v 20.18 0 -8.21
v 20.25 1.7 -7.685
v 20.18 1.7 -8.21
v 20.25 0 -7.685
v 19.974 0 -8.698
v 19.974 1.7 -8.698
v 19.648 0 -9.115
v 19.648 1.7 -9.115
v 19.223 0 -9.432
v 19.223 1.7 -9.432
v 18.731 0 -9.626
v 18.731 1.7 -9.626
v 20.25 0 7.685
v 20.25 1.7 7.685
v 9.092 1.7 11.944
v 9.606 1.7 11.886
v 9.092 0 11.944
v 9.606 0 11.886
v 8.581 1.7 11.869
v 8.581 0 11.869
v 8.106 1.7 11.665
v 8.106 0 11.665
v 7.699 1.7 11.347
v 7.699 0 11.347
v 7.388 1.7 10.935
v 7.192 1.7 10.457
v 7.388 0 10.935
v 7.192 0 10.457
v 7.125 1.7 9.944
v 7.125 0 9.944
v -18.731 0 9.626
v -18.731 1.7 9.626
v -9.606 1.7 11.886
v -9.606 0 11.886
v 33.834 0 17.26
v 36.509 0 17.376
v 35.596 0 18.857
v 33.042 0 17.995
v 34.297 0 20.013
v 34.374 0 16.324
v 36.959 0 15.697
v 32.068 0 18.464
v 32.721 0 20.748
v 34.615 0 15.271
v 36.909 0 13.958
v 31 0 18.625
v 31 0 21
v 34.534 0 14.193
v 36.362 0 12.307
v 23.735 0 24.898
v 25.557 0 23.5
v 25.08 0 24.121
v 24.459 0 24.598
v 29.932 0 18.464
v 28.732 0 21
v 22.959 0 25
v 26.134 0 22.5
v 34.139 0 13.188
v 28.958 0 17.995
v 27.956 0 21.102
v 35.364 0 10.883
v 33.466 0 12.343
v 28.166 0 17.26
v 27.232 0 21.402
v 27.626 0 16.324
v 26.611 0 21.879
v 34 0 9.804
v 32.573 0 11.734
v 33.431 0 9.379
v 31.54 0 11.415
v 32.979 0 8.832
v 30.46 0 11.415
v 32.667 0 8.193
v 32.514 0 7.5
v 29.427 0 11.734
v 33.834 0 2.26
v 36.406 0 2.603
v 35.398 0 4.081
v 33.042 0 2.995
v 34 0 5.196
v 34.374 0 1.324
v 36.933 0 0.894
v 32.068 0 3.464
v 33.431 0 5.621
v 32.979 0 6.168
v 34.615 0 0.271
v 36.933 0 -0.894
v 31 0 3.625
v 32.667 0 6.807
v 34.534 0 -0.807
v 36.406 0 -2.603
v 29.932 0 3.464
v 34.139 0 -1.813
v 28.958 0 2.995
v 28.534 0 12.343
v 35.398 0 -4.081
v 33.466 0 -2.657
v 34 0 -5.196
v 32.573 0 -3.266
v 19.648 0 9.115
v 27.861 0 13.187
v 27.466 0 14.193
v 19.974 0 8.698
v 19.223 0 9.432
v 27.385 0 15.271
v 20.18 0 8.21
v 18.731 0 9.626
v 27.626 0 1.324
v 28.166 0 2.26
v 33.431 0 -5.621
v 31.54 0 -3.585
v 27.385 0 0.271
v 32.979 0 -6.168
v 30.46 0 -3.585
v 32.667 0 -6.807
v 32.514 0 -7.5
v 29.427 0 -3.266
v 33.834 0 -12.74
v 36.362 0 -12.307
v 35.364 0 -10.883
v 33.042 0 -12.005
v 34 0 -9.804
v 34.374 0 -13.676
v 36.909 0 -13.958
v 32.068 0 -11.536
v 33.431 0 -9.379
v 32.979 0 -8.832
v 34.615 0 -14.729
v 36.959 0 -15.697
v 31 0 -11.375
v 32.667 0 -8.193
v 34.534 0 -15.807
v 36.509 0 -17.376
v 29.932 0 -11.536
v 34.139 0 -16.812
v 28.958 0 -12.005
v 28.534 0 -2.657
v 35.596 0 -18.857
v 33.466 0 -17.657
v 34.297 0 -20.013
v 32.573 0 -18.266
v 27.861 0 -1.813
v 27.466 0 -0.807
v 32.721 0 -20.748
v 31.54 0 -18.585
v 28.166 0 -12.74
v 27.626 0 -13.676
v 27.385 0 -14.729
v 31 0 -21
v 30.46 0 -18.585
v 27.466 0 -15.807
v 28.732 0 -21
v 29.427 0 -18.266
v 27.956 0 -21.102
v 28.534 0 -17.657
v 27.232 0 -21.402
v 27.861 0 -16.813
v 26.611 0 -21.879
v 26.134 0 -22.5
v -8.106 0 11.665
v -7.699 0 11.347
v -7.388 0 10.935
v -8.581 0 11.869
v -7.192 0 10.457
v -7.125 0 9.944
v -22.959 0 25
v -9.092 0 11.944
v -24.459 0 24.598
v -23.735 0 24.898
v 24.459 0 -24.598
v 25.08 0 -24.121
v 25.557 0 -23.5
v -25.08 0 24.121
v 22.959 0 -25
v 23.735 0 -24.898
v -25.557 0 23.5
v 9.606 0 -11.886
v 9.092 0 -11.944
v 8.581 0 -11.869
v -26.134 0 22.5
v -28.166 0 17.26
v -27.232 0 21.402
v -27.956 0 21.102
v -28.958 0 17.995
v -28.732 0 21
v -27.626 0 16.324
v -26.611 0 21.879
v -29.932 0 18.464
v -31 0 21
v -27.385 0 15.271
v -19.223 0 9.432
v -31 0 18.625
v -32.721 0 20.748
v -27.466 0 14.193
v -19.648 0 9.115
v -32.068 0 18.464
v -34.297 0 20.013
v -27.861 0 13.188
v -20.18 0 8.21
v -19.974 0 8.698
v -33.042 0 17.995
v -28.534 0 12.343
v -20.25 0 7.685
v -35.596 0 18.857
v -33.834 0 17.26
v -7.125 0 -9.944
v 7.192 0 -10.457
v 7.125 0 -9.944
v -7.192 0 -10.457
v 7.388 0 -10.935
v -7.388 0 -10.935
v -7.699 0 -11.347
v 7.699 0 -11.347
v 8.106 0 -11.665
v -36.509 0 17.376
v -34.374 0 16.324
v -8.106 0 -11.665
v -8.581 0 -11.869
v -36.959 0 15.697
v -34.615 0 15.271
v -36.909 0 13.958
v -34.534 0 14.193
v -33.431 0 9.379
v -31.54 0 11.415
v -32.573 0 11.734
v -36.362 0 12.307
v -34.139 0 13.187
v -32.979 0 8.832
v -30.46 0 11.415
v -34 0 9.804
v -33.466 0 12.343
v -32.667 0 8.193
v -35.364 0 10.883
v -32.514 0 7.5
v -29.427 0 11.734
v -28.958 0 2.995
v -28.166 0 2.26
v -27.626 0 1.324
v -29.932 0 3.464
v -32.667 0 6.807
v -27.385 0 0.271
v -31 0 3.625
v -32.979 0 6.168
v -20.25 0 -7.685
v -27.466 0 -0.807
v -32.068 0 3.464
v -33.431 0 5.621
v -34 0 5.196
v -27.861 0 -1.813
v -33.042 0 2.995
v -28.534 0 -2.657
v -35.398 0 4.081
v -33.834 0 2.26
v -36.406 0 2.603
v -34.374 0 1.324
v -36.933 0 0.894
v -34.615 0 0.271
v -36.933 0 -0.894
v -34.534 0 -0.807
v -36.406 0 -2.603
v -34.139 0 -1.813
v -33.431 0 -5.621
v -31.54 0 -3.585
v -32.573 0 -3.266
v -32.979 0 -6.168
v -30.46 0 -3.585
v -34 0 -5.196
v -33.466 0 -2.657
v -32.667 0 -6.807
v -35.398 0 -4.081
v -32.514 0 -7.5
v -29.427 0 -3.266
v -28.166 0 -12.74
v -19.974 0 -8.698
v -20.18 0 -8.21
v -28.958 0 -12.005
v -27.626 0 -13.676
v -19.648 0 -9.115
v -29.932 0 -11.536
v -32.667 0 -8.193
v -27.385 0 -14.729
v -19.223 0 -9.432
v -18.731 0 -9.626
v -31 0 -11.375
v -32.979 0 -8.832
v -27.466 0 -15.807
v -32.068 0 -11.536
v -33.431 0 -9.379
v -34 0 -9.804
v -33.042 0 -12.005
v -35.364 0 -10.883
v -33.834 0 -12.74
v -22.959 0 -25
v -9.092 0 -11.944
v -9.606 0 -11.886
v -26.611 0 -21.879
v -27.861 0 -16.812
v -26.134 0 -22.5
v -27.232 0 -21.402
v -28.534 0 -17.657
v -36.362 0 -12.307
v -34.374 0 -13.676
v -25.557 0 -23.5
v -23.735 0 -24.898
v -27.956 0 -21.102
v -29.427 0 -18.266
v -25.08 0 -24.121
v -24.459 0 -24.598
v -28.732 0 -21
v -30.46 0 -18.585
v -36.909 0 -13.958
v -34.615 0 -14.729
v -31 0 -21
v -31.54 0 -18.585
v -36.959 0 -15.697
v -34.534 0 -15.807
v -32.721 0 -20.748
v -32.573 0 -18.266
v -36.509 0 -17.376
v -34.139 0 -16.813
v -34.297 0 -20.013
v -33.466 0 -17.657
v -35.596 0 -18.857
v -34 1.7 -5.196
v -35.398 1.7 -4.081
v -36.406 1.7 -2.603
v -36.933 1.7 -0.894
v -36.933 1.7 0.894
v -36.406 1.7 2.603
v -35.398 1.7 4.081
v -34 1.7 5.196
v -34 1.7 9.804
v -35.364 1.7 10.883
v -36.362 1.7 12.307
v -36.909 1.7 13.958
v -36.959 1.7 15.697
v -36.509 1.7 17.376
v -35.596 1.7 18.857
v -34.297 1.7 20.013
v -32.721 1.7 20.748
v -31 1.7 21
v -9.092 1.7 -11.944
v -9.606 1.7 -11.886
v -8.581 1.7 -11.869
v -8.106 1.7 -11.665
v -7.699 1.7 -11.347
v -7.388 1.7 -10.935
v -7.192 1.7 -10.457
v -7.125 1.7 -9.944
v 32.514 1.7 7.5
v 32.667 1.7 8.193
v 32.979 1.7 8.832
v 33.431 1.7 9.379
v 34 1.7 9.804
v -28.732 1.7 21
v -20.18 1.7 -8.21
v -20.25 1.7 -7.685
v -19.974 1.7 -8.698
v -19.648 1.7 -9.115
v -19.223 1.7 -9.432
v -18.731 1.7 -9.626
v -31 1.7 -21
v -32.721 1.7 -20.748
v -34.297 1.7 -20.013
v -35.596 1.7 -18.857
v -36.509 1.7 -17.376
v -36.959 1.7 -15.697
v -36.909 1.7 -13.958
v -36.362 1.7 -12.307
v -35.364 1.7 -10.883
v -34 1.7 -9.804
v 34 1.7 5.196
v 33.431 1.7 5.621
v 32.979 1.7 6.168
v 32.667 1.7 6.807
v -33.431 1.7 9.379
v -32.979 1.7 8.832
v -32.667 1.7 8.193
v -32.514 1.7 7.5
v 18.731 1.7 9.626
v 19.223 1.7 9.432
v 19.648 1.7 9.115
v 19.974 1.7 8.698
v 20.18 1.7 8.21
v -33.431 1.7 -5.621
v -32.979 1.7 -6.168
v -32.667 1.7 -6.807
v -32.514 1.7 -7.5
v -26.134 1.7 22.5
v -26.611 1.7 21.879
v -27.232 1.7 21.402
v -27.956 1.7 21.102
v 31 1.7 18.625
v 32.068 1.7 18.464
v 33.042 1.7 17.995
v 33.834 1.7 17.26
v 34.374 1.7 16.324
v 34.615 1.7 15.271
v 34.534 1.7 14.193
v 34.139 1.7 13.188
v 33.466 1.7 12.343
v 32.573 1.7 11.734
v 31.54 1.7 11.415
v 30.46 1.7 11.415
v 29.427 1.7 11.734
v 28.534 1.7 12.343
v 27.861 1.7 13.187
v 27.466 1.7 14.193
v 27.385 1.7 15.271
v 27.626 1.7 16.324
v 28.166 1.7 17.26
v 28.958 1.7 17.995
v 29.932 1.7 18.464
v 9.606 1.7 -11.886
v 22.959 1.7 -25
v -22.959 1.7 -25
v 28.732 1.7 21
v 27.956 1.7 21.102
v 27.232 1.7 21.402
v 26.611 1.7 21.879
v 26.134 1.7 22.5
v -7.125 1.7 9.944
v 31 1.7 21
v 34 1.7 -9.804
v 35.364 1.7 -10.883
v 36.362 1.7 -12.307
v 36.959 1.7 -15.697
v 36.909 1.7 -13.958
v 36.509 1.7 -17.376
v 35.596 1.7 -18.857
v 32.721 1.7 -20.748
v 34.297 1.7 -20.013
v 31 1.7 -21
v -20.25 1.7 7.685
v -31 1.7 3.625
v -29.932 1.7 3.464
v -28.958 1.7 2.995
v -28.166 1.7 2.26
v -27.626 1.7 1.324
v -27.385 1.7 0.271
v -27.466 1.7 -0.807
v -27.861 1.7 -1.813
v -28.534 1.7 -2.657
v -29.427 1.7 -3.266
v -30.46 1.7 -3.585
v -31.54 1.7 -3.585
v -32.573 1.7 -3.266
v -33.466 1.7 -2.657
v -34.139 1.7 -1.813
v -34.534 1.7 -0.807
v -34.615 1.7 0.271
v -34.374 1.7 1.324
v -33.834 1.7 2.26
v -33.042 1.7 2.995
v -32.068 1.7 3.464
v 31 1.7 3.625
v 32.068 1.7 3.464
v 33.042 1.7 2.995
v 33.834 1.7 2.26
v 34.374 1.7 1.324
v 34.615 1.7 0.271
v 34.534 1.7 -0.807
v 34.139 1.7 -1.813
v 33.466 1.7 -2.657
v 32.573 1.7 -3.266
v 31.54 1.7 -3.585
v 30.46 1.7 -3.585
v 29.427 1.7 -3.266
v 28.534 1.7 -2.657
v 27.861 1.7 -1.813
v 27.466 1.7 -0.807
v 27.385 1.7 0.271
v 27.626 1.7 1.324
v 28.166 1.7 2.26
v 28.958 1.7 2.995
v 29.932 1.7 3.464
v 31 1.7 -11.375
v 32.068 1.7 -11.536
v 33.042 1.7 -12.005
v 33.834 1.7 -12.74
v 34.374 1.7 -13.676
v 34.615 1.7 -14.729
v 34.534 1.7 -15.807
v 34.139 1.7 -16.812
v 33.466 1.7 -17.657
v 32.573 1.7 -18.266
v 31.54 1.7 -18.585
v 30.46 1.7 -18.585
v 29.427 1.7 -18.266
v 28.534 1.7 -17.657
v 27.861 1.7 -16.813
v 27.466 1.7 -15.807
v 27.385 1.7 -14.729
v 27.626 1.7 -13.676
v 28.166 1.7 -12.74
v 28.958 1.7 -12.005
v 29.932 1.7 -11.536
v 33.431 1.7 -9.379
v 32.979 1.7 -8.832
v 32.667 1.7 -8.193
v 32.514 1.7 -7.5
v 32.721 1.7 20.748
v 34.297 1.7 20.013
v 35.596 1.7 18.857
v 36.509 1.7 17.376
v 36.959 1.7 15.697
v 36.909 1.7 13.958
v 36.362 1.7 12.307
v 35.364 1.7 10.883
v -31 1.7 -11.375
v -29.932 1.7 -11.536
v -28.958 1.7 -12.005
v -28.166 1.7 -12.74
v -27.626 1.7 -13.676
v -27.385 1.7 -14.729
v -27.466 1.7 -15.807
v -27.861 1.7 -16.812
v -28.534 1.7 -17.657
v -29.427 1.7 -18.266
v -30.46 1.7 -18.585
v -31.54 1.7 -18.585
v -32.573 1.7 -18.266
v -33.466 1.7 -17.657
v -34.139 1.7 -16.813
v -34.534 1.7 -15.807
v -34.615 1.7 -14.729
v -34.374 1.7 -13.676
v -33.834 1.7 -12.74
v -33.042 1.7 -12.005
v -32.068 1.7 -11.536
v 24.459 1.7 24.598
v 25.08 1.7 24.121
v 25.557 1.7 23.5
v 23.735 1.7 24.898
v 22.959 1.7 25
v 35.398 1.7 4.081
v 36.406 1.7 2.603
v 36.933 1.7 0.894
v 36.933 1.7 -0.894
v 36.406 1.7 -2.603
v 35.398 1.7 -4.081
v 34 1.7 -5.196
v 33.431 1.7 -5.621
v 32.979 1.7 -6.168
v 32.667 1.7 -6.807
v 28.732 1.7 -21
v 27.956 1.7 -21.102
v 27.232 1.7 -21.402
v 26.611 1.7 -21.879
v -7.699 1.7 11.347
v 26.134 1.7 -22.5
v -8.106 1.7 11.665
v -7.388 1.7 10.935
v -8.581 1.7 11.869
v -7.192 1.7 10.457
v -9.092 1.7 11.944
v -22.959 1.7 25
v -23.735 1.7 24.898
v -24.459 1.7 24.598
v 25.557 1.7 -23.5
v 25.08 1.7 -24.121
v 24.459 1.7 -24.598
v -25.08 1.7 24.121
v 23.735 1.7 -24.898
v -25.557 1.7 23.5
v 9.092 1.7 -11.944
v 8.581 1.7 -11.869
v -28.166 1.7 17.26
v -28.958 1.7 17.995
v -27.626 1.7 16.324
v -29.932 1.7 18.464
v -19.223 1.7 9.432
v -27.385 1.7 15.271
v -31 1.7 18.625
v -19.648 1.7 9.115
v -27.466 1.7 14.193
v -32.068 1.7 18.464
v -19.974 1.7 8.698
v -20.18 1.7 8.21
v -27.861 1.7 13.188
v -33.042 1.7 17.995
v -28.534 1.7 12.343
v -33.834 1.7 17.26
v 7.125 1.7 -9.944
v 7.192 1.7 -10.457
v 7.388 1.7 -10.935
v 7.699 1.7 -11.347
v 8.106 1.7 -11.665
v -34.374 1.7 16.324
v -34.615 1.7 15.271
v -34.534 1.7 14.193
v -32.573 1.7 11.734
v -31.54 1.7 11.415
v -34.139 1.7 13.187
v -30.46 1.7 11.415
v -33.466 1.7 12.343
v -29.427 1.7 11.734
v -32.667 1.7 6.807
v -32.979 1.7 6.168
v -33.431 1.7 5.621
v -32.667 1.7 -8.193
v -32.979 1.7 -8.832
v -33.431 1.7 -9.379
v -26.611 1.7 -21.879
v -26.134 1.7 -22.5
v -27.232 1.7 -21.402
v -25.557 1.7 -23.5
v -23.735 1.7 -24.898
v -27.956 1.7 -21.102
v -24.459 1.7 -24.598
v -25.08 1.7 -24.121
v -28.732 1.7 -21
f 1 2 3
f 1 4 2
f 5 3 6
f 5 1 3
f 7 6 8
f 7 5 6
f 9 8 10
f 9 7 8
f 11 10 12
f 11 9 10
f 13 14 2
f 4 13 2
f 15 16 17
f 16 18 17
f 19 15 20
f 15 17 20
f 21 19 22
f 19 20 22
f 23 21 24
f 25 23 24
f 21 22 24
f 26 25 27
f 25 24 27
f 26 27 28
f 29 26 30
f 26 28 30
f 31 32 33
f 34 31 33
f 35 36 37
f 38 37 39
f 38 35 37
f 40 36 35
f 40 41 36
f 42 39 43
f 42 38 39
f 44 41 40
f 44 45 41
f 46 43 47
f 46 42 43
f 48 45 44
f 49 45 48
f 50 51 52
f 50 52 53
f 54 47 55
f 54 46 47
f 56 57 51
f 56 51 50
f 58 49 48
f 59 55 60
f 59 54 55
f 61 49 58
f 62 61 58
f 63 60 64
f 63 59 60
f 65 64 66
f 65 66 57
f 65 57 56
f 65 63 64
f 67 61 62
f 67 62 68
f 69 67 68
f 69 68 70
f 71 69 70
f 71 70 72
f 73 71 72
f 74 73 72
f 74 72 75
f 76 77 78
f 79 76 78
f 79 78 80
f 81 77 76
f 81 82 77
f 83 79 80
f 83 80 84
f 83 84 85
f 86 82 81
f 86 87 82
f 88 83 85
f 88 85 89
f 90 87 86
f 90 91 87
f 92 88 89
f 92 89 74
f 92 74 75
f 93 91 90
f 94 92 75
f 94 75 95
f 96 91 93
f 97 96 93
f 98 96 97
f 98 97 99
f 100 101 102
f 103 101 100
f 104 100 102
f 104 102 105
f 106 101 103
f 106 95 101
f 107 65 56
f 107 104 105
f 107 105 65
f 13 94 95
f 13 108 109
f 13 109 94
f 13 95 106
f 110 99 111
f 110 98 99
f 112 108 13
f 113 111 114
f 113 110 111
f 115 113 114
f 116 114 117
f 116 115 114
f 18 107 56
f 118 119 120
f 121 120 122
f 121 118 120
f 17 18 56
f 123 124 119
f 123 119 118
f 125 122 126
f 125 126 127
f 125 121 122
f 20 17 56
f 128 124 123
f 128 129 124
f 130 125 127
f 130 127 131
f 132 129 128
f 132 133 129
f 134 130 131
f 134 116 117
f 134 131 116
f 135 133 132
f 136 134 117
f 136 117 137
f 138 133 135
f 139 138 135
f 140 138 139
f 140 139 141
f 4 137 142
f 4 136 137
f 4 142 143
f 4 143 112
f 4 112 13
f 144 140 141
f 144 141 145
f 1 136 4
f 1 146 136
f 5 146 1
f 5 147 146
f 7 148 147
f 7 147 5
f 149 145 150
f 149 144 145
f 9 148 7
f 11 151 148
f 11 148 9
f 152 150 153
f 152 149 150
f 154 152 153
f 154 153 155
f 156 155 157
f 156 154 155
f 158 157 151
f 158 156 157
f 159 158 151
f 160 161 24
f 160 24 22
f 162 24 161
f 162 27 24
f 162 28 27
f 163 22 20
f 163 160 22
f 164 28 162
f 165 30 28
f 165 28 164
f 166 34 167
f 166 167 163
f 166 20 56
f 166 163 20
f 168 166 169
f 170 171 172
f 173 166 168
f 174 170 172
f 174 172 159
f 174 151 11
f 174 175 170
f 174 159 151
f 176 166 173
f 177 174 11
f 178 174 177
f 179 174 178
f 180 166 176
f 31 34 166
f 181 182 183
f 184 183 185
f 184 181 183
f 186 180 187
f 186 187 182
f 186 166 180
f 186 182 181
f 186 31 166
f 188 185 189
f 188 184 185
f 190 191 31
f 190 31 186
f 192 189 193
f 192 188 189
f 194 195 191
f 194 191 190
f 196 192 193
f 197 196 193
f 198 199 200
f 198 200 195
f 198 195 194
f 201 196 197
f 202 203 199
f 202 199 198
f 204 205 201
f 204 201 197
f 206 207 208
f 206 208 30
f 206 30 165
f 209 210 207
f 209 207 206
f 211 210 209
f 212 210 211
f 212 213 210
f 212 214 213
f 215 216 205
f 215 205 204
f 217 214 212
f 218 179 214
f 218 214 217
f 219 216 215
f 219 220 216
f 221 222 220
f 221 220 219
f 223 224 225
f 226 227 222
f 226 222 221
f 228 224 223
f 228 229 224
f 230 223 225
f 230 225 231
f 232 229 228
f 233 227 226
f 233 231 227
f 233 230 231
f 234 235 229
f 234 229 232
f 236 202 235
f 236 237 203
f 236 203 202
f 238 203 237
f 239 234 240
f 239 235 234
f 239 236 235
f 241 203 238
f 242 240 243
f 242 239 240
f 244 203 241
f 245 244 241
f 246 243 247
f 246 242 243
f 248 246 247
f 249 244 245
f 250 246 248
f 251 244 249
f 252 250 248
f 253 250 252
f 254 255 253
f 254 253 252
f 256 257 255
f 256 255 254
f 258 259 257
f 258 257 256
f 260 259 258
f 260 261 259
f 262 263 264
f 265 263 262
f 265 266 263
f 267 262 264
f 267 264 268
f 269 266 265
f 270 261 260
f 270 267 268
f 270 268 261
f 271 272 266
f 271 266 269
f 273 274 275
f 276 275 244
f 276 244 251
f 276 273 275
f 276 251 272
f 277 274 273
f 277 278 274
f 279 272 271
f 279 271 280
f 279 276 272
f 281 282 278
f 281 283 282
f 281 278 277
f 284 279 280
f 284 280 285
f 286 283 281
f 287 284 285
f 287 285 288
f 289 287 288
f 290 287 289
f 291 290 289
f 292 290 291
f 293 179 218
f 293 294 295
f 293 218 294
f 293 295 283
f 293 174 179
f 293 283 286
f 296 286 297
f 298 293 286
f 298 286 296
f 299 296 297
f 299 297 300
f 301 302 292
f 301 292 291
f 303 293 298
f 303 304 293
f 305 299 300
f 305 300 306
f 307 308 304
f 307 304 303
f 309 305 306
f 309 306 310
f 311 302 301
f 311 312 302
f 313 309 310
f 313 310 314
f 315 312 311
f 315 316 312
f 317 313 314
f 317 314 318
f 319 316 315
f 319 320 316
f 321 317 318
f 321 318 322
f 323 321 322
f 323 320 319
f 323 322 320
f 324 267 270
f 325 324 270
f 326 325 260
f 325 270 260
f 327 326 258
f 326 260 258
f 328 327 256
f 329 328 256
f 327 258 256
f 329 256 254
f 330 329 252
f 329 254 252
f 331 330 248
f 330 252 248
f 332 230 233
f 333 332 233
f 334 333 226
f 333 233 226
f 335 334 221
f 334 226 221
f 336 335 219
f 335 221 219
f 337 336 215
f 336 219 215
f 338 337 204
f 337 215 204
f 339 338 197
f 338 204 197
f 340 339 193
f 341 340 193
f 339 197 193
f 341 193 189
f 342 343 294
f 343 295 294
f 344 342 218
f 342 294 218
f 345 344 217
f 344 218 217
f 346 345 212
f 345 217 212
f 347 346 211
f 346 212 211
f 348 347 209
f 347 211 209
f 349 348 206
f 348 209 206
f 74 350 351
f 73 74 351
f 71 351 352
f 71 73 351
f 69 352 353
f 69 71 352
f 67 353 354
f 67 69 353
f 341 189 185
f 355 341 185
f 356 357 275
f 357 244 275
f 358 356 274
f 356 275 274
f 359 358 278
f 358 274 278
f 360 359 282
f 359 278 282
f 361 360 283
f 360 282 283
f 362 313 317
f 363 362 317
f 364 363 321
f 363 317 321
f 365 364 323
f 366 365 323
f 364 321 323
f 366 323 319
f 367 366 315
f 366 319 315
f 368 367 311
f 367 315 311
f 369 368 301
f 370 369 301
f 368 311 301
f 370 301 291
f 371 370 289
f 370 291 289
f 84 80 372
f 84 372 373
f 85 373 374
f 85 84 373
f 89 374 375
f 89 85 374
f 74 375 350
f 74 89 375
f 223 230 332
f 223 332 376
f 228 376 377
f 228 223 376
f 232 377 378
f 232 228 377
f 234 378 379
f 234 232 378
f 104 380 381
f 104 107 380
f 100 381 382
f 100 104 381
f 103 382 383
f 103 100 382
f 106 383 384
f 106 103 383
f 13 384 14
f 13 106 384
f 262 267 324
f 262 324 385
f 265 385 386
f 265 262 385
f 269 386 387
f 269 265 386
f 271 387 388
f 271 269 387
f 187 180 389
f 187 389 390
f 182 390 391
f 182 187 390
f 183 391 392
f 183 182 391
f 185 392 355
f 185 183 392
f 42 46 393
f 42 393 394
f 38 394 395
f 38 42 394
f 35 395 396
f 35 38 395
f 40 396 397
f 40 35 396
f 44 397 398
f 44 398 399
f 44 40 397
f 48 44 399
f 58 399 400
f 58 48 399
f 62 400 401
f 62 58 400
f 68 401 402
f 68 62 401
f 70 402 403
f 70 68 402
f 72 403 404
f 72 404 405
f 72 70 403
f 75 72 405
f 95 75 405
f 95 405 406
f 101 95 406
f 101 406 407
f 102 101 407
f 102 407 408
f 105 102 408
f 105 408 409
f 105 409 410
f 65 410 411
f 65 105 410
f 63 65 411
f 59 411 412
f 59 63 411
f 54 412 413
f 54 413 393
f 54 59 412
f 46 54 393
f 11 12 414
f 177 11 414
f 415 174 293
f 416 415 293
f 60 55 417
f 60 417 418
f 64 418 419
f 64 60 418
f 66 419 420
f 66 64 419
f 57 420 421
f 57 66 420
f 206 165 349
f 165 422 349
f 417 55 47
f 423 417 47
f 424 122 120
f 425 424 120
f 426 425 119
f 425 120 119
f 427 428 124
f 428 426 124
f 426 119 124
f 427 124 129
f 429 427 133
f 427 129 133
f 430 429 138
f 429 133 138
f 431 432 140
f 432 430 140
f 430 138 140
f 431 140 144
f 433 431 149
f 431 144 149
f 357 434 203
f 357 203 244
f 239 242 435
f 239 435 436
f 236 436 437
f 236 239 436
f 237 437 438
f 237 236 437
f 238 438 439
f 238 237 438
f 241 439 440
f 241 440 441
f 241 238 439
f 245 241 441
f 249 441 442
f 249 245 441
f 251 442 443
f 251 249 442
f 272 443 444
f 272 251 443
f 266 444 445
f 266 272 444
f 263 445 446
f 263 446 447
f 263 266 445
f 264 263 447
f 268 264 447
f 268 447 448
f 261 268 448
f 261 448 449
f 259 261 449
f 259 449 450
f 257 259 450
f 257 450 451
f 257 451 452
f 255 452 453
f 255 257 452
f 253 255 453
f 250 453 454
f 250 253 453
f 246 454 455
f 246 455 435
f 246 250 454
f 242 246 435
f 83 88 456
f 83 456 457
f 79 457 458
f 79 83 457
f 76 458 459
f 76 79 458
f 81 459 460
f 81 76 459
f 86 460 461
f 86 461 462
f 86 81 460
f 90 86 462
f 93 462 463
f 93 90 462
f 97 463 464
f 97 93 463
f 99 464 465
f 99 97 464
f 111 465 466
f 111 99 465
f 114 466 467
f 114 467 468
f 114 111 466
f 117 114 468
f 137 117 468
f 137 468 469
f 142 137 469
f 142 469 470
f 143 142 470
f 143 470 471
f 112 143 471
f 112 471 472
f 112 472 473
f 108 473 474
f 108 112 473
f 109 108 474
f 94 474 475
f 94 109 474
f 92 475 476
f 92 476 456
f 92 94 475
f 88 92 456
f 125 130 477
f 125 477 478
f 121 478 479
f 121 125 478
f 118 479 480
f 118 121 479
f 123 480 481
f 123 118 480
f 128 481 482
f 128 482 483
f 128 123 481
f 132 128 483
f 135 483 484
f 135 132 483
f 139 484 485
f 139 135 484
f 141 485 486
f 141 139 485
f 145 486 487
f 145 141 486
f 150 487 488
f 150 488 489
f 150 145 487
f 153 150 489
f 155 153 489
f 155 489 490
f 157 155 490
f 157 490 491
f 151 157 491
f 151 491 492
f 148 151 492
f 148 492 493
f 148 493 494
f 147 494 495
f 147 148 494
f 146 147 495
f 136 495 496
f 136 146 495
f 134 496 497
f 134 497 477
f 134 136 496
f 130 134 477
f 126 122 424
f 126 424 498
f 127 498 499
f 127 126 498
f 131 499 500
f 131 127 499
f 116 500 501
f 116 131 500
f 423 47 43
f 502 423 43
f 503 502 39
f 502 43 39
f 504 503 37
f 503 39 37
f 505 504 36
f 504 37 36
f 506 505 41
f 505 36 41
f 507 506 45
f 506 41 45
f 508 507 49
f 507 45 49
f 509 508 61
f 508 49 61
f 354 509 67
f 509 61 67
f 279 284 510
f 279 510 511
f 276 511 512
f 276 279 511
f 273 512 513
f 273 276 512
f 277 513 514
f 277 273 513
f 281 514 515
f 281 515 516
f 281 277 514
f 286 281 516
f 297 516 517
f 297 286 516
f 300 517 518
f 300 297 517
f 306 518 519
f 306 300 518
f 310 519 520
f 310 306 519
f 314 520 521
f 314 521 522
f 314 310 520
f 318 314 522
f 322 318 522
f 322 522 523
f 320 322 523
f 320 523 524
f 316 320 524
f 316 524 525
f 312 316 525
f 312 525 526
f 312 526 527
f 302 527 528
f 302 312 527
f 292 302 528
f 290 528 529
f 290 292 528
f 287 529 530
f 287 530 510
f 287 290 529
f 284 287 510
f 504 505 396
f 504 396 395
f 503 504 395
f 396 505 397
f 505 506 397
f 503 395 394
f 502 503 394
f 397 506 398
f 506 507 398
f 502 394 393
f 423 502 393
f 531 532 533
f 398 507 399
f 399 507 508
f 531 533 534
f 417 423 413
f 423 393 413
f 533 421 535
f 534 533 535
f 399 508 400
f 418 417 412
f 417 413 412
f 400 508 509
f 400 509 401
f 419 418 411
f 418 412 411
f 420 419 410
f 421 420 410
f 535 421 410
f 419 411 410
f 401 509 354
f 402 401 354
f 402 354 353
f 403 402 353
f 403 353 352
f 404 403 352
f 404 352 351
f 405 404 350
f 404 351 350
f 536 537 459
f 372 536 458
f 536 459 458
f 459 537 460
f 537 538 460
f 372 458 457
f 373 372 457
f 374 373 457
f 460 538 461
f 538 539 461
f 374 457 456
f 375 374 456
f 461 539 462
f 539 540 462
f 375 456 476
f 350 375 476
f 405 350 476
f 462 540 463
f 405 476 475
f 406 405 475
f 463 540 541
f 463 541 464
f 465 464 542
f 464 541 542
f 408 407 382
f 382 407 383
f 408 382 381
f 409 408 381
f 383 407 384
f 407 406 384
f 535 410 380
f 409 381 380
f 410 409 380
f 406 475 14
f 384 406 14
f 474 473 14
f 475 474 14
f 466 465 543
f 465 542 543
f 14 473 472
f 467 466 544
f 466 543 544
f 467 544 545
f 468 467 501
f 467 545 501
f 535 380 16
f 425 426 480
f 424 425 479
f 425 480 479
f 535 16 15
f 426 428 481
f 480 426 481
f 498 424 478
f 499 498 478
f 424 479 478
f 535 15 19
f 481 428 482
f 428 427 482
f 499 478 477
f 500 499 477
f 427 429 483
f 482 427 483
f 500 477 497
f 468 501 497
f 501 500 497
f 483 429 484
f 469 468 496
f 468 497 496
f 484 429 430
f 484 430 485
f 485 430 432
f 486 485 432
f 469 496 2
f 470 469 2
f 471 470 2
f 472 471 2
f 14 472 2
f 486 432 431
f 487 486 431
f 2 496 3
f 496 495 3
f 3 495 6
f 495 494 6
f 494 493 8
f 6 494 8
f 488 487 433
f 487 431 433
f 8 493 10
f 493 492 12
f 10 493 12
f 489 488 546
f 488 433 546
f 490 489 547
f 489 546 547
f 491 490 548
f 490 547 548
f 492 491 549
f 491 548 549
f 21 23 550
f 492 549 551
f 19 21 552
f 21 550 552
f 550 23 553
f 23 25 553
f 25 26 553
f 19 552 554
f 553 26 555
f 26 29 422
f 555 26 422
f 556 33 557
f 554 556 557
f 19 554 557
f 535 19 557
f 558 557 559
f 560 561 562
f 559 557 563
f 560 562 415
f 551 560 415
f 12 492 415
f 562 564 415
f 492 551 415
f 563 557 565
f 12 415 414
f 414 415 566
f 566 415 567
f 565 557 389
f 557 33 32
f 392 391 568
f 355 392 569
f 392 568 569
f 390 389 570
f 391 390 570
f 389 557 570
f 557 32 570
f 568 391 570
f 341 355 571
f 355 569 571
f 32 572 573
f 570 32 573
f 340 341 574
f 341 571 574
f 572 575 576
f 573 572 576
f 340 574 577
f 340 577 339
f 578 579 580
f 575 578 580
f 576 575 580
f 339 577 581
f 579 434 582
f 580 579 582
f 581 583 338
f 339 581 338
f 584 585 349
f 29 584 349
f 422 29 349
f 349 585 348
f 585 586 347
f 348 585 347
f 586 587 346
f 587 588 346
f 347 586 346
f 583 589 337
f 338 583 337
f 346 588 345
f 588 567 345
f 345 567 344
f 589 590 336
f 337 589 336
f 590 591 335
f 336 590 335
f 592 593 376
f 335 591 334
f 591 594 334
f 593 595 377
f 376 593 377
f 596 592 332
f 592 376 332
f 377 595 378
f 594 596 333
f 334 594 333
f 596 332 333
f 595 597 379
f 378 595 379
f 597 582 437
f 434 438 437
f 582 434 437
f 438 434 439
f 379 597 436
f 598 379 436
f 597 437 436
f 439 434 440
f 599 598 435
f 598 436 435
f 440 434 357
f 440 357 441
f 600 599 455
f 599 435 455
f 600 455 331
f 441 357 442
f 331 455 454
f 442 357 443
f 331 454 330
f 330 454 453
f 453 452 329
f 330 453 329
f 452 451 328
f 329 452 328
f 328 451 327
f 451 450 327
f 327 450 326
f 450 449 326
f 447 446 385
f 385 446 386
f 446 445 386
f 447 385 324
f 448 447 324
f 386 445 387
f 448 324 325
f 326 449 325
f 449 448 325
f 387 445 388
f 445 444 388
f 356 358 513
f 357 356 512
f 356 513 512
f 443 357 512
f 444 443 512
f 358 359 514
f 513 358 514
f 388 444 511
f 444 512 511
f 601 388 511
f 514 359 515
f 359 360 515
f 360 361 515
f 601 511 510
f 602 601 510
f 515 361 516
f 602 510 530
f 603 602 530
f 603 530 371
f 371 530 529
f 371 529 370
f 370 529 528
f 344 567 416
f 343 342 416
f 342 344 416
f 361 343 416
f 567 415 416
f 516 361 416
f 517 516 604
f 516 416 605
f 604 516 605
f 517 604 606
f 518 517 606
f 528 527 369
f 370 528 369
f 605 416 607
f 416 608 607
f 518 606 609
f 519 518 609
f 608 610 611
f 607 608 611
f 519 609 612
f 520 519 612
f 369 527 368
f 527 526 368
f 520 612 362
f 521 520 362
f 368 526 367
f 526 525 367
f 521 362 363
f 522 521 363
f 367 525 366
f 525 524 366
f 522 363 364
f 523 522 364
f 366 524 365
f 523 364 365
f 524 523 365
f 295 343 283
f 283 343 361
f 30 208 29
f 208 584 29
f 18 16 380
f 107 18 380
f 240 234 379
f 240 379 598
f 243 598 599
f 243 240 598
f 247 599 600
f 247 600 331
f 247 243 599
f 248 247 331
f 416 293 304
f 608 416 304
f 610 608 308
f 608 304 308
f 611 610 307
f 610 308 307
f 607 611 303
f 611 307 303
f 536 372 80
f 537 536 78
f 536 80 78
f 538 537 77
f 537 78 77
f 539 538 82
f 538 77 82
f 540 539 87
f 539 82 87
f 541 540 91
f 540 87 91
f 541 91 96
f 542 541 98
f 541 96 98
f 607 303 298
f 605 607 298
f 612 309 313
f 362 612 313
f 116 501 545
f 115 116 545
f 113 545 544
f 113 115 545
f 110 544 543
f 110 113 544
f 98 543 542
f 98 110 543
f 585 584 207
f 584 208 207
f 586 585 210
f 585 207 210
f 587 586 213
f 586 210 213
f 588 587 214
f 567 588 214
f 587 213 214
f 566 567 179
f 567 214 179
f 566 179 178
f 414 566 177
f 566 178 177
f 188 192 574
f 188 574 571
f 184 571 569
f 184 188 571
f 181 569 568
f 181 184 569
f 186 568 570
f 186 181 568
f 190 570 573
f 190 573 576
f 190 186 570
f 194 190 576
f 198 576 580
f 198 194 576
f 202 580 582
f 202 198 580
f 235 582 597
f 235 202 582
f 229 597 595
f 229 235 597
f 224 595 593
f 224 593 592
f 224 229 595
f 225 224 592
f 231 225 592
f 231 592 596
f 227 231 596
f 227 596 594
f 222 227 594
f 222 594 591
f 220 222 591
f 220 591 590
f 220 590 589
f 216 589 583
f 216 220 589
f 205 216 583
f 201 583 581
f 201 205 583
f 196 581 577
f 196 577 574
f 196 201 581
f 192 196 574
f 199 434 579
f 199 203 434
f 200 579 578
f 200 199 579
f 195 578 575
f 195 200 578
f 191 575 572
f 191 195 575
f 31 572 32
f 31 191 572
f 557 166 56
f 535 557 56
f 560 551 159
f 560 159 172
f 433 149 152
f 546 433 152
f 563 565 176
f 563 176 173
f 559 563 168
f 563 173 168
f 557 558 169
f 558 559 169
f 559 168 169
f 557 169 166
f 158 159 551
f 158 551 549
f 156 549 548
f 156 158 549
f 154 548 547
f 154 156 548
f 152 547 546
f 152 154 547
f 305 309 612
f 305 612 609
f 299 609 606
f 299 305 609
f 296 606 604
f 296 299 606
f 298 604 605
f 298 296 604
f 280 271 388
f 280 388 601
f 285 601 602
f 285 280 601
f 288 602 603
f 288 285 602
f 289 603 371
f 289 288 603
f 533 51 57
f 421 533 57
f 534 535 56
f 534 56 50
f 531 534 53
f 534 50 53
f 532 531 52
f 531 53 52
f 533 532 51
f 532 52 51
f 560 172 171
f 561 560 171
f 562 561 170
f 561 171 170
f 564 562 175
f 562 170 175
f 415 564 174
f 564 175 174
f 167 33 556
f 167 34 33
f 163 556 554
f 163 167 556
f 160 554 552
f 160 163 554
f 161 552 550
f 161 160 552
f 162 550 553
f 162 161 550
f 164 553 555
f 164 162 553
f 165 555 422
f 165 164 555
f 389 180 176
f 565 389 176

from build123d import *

# Parameters (mm, degrees)
SKETCH1_R           = 6
SKETCH1_R_2         = 3.625
BOSS_EXTRUDE1_DEPTH = 1.7
CUT_EXTRUDE1_REACH  = 46.687
SKETCH2_W           = 13.125
SKETCH2_H           = 18.5
FILLET1_R           = 3
FILLET2_R           = 2


with BuildPart() as part:
    # Sketch1 → Boss-Extrude1 (new body)
    # profile 1 of 7: a face of its own
    with BuildSketch(Plane(origin=(0, 0, 0), x_dir=(1, 0, 0), z_dir=(0, 1, 0))):
        with BuildLine():
            Line((24.690598923, 25), (-24.690598923, 25))
            Line((-24.690598923, 25), (-27, 21))
            Line((-27, 21), (-31, 21))
            ThreePointArc((-31, 21), (-26.757359313, 19.242640687), (-25, 15))
            ThreePointArc((-25, 15), (-27.325765386, 10.25658351), (-32.5, 9.190524981))
            Line((-32.5, 9.190524981), (-32.5, 5.809475019))
            ThreePointArc((-32.5, 5.809475019), (-27.325765386, 4.74341649), (-25, 0))
            ThreePointArc((-25, 0), (-27.325765386, -4.74341649), (-32.5, -5.809475019))
            Line((-32.5, -5.809475019), (-32.5, -9.190524981))
            ThreePointArc((-32.5, -9.190524981), (-27.325765386, -10.25658351), (-25, -15))
            ThreePointArc((-25, -15), (-26.757359313, -19.242640687), (-31, -21))
            Line((-31, -21), (-27, -21))
            Line((-27, -21), (-24.690598923, -25))
            Line((-24.690598923, -25), (24.690598923, -25))
            Line((24.690598923, -25), (27, -21))
            Line((27, -21), (31, -21))
            ThreePointArc((31, -21), (25.047821822, -14.243974245), (32.5, -9.190524981))
            Line((32.5, -9.190524981), (32.5, -5.809475019))
            ThreePointArc((32.5, -5.809475019), (25, 0), (32.5, 5.809475019))
            Line((32.5, 5.809475019), (32.5, 9.190524981))
            ThreePointArc((32.5, 9.190524981), (25.047821822, 14.243974245), (31, 21))
            Line((31, 21), (27, 21))
            Line((27, 21), (24.690598923, 25))
        make_face()
    # profile 2 of 7: a face of its own
    with BuildSketch(Plane(origin=(0, 0, 0), x_dir=(1, 0, 0), z_dir=(0, 1, 0))):
        with Locations((-31, 15)):
            Circle(SKETCH1_R)
        with Locations(Location((-31, 15, 0), (0, 0, 270))):
            Circle(SKETCH1_R_2, mode=Mode.SUBTRACT)
    # profile 3 of 7: a face of its own
    with BuildSketch(Plane(origin=(0, 0, 0), x_dir=(1, 0, 0), z_dir=(0, 1, 0))):
        with Locations((-31, 0)):
            Circle(SKETCH1_R)
        with Locations(Location((-31, 0, 0), (0, 0, 270))):
            Circle(SKETCH1_R_2, mode=Mode.SUBTRACT)
    # profile 4 of 7: a face of its own
    with BuildSketch(Plane(origin=(0, 0, 0), x_dir=(1, 0, 0), z_dir=(0, 1, 0))):
        with Locations((-31, -15)):
            Circle(SKETCH1_R)
        with Locations(Location((-31, -15, 0), (0, 0, 270))):
            Circle(SKETCH1_R_2, mode=Mode.SUBTRACT)
    # profile 5 of 7: a face of its own
    with BuildSketch(Plane(origin=(0, 0, 0), x_dir=(1, 0, 0), z_dir=(0, 1, 0))):
        with Locations((31, -15)):
            Circle(SKETCH1_R)
        with Locations(Location((31, -15, 0), (0, 0, 270))):
            Circle(SKETCH1_R_2, mode=Mode.SUBTRACT)
    # profile 6 of 7: a face of its own
    with BuildSketch(Plane(origin=(0, 0, 0), x_dir=(1, 0, 0), z_dir=(0, 1, 0))):
        with Locations((31, 0)):
            Circle(SKETCH1_R)
        with Locations(Location((31, 0, 0), (0, 0, 270))):
            Circle(SKETCH1_R_2, mode=Mode.SUBTRACT)
    # profile 7 of 7: a face of its own
    with BuildSketch(Plane(origin=(0, 0, 0), x_dir=(1, 0, 0), z_dir=(0, 1, 0))):
        with Locations((31, 15)):
            Circle(SKETCH1_R)
        with Locations(Location((31, 15, 0), (0, 0, 270))):
            Circle(SKETCH1_R_2, mode=Mode.SUBTRACT)
    extrude(amount=BOSS_EXTRUDE1_DEPTH)

    # Sketch2 → Cut-Extrude1 (cut, up to next)
    with BuildSketch(Plane(origin=(0, 1.7, 0), x_dir=(1, 0, 0), z_dir=(0, 1, 0)), mode=Mode.PRIVATE) as cut_extrude1_sk1:
        with Locations((-13.6875, 0)):
            Rectangle(SKETCH2_W, SKETCH2_H)
    cut_extrude1_tool1 = extrude(cut_extrude1_sk1.sketch, amount=-CUT_EXTRUDE1_REACH, mode=Mode.PRIVATE) & part.part
    # Sketch2 → Cut-Extrude1 (cut, up to next)
    with BuildSketch(Plane(origin=(0, 1.7, 0), x_dir=(1, 0, 0), z_dir=(0, 1, 0)), mode=Mode.PRIVATE) as cut_extrude1_sk2:
        Polygon((-7.125, 9.25), (-7.125, 12.5), (-20.25, 9.25), align=None)
    cut_extrude1_tool2 = extrude(cut_extrude1_sk2.sketch, amount=-CUT_EXTRUDE1_REACH, mode=Mode.PRIVATE) & part.part
    # Sketch2 → Cut-Extrude1 (cut, up to next)
    with BuildSketch(Plane(origin=(0, 1.7, 0), x_dir=(1, 0, 0), z_dir=(0, 1, 0)), mode=Mode.PRIVATE) as cut_extrude1_sk3:
        Polygon((-7.125, -12.5), (-7.125, -9.25), (-20.25, -9.25), align=None)
    cut_extrude1_tool3 = extrude(cut_extrude1_sk3.sketch, amount=-CUT_EXTRUDE1_REACH, mode=Mode.PRIVATE) & part.part
    # Sketch2 → Cut-Extrude1 (cut, up to next)
    with BuildSketch(Plane(origin=(0, 1.7, 0), x_dir=(1, 0, 0), z_dir=(0, 1, 0)), mode=Mode.PRIVATE) as cut_extrude1_sk4:
        Polygon((7.125, -12.5), (20.25, -9.25), (7.125, -9.25), align=None)
    cut_extrude1_tool4 = extrude(cut_extrude1_sk4.sketch, amount=-CUT_EXTRUDE1_REACH, mode=Mode.PRIVATE) & part.part
    # Sketch2 → Cut-Extrude1 (cut, up to next)
    with BuildSketch(Plane(origin=(0, 1.7, 0), x_dir=(1, 0, 0), z_dir=(0, 1, 0)), mode=Mode.PRIVATE) as cut_extrude1_sk5:
        with Locations((13.6875, 0)):
            Rectangle(SKETCH2_W, SKETCH2_H)
    cut_extrude1_tool5 = extrude(cut_extrude1_sk5.sketch, amount=-CUT_EXTRUDE1_REACH, mode=Mode.PRIVATE) & part.part
    # Sketch2 → Cut-Extrude1 (cut, up to next)
    with BuildSketch(Plane(origin=(0, 1.7, 0), x_dir=(1, 0, 0), z_dir=(0, 1, 0)), mode=Mode.PRIVATE) as cut_extrude1_sk6:
        Polygon((20.25, 9.25), (7.125, 12.5), (7.125, 9.25), align=None)
    cut_extrude1_tool6 = extrude(cut_extrude1_sk6.sketch, amount=-CUT_EXTRUDE1_REACH, mode=Mode.PRIVATE) & part.part
    add(cut_extrude1_tool1.solids().sort_by_distance((-13.6875, 1.7, 0))[0], mode=Mode.SUBTRACT)
    add(cut_extrude1_tool2.solids().sort_by_distance((-11.5, 1.7, -10.333333))[0], mode=Mode.SUBTRACT)
    add(cut_extrude1_tool3.solids().sort_by_distance((-11.5, 1.7, 10.333333))[0], mode=Mode.SUBTRACT)
    add(cut_extrude1_tool4.solids().sort_by_distance((11.5, 1.7, 10.333333))[0], mode=Mode.SUBTRACT)
    add(cut_extrude1_tool5.solids().sort_by_distance((13.6875, 1.7, 0))[0], mode=Mode.SUBTRACT)
    add(cut_extrude1_tool6.solids().sort_by_distance((11.5, 1.7, -10.333333))[0], mode=Mode.SUBTRACT)

    # Fillet1
    # the kernel refuses this fillet: 3 mm, written as the material it adds along each edge
    with BuildSketch(Plane(origin=(32.5, 0, 9.190524981), x_dir=(0, 0, -1), z_dir=(0, 1, 0)), Plane(origin=(32.5, 0, -5.809475019), x_dir=(0, 0, -1), z_dir=(0, 1, 0))) as fillet1_piece_1:
        with BuildLine():
            CenterArc((1.984753615, -3), FILLET1_R, 90, 60)
            ThreePointArc((-0.613322597, -1.5), (-0.255786259, -0.770801874), (0, 0))
            Line((0, 0), (1.984753615, 0))
        make_face()
    extrude(amount=1.7)
    with BuildSketch(Plane(origin=(32.5, 0, 5.809475019), x_dir=(0.9256147934109572, 0, -0.3784669790335627), z_dir=(0, 1, 0)), Plane(origin=(32.5, 0, -9.190524981), x_dir=(0.9256147934109562, 0, -0.378466979033565), z_dir=(0, 1, 0))) as fillet1_piece_2:
        with BuildLine():
            CenterArc((2.025680676, -2.972518244), FILLET1_R, 97.761243907, 60)
            Line((-0.751163705, -1.837117307), (0, 0))
            ThreePointArc((0, 0), (0.81027227, -0.054963512), (1.62054454, 0))
        make_face()
    extrude(amount=1.7)
    with BuildSketch(Plane(origin=(-32.5, 0, 9.190524981), x_dir=(0, 0, -1), z_dir=(0, 1, 0)), Plane(origin=(-32.5, 0, -5.809475019), x_dir=(0, 0, -1), z_dir=(0, 1, 0))) as fillet1_piece_3:
        with BuildLine():
            CenterArc((1.984753615, 3), FILLET1_R, 210, 60)
            ThreePointArc((-0.613322597, 1.5), (-0.255786259, 0.770801874), (0, 0))
            Line((0, 0), (1.984753615, 0))
        make_face()
    extrude(amount=1.7)
    with BuildSketch(Plane(origin=(-32.5, 0, 5.809475019), x_dir=(-0.9256147934109573, 0, -0.3784669790335622), z_dir=(0, 1, 0)), Plane(origin=(-32.5, 0, -9.190524981), x_dir=(-0.9256147934109568, 0, -0.37846697903356347), z_dir=(0, 1, 0))) as fillet1_piece_4:
        with BuildLine():
            CenterArc((2.025680676, 2.972518244), FILLET1_R, 202.238756093, 60)
            Line((-0.751163705, 1.837117307), (0, 0))
            ThreePointArc((0, 0), (0.81027227, 0.054963512), (1.62054454, 0))
        make_face()
    extrude(amount=1.7)
    with BuildSketch(Plane(origin=(-27, 0, 21), x_dir=(0.49999999999999767, 0, 0.8660254037844399), z_dir=(0, 1, 0)), Plane(origin=(27, 0, 21), x_dir=(1, 0, 0), z_dir=(0, 1, 0))) as fillet1_piece_5:
        with BuildLine():
            CenterArc((FILLET1_R * 0.57735026919, -FILLET1_R), FILLET1_R, 90, 60)
            Line((-FILLET1_R * 0.288675134595, -FILLET1_R * 0.5), (0, 0))
            Line((0, 0), (FILLET1_R * 0.57735026919, 0))
        make_face()
    extrude(amount=1.7)
    with BuildSketch(Plane(origin=(27, 0, -21), x_dir=(1, 0, 0), z_dir=(0, 1, 0)), Plane(origin=(-27, 0, -21), x_dir=(0.49999999999999767, 0, -0.8660254037844399), z_dir=(0, 1, 0))) as fillet1_piece_6:
        with BuildLine():
            CenterArc((FILLET1_R * 0.57735026919, FILLET1_R), FILLET1_R, 210, 60)
            Line((-FILLET1_R * 0.288675134595, FILLET1_R * 0.5), (0, 0))
            Line((0, 0), (FILLET1_R * 0.57735026919, 0))
        make_face()
    extrude(amount=1.7)
    # the kernel refuses this fillet: 3 mm, written as the material it takes off along each edge
    with BuildSketch(Plane(origin=(-24.690598923, -4.330127019, 25), x_dir=(1, 0, 0), z_dir=(0, 1, 0)), Plane(origin=(24.690598923, -4.330127019, 25), x_dir=(0.49999999999999767, 0, -0.8660254037844399), z_dir=(0, 1, 0))) as fillet1_2_piece_1:
        with BuildLine():
            CenterArc((FILLET1_R * 0.57735026919, FILLET1_R), FILLET1_R, 210, 60)
            Line((-FILLET1_R * 0.288675134595, FILLET1_R * 0.5), (0, 0))
            Line((0, 0), (FILLET1_R * 0.57735026919, 0))
        make_face()
    extrude(amount=10.360254038, mode=Mode.SUBTRACT)
    with BuildSketch(Plane(origin=(24.690598923, -4.330127019, -25), x_dir=(0.49999999999999767, 0, 0.8660254037844399), z_dir=(0, 1, 0)), Plane(origin=(-24.690598923, -4.330127019, -25), x_dir=(1, 0, 0), z_dir=(0, 1, 0))) as fillet1_2_piece_2:
        with BuildLine():
            CenterArc((FILLET1_R * 0.57735026919, -FILLET1_R), FILLET1_R, 90, 60)
            Line((-FILLET1_R * 0.288675134595, -FILLET1_R * 0.5), (0, 0))
            Line((0, 0), (FILLET1_R * 0.57735026919, 0))
        make_face()
    extrude(amount=10.360254038, mode=Mode.SUBTRACT)

    # Fillet2
    fillet2_edges = [part.edges().sort_by_distance(p)[0] for p in [
        (-20.25, 0.85, 9.25),
        (-20.25, 0.85, -9.25),
        (-7.125, 0.85, -12.5),
        (-7.125, 0.85, 12.5),
        (20.25, 0.85, 9.25),
        (7.125, 0.85, 12.5),
        (7.125, 0.85, -12.5),
        (20.25, 0.85, -9.25),
    ]]
    fillet(fillet2_edges, radius=FILLET2_R)


solid = part.part
